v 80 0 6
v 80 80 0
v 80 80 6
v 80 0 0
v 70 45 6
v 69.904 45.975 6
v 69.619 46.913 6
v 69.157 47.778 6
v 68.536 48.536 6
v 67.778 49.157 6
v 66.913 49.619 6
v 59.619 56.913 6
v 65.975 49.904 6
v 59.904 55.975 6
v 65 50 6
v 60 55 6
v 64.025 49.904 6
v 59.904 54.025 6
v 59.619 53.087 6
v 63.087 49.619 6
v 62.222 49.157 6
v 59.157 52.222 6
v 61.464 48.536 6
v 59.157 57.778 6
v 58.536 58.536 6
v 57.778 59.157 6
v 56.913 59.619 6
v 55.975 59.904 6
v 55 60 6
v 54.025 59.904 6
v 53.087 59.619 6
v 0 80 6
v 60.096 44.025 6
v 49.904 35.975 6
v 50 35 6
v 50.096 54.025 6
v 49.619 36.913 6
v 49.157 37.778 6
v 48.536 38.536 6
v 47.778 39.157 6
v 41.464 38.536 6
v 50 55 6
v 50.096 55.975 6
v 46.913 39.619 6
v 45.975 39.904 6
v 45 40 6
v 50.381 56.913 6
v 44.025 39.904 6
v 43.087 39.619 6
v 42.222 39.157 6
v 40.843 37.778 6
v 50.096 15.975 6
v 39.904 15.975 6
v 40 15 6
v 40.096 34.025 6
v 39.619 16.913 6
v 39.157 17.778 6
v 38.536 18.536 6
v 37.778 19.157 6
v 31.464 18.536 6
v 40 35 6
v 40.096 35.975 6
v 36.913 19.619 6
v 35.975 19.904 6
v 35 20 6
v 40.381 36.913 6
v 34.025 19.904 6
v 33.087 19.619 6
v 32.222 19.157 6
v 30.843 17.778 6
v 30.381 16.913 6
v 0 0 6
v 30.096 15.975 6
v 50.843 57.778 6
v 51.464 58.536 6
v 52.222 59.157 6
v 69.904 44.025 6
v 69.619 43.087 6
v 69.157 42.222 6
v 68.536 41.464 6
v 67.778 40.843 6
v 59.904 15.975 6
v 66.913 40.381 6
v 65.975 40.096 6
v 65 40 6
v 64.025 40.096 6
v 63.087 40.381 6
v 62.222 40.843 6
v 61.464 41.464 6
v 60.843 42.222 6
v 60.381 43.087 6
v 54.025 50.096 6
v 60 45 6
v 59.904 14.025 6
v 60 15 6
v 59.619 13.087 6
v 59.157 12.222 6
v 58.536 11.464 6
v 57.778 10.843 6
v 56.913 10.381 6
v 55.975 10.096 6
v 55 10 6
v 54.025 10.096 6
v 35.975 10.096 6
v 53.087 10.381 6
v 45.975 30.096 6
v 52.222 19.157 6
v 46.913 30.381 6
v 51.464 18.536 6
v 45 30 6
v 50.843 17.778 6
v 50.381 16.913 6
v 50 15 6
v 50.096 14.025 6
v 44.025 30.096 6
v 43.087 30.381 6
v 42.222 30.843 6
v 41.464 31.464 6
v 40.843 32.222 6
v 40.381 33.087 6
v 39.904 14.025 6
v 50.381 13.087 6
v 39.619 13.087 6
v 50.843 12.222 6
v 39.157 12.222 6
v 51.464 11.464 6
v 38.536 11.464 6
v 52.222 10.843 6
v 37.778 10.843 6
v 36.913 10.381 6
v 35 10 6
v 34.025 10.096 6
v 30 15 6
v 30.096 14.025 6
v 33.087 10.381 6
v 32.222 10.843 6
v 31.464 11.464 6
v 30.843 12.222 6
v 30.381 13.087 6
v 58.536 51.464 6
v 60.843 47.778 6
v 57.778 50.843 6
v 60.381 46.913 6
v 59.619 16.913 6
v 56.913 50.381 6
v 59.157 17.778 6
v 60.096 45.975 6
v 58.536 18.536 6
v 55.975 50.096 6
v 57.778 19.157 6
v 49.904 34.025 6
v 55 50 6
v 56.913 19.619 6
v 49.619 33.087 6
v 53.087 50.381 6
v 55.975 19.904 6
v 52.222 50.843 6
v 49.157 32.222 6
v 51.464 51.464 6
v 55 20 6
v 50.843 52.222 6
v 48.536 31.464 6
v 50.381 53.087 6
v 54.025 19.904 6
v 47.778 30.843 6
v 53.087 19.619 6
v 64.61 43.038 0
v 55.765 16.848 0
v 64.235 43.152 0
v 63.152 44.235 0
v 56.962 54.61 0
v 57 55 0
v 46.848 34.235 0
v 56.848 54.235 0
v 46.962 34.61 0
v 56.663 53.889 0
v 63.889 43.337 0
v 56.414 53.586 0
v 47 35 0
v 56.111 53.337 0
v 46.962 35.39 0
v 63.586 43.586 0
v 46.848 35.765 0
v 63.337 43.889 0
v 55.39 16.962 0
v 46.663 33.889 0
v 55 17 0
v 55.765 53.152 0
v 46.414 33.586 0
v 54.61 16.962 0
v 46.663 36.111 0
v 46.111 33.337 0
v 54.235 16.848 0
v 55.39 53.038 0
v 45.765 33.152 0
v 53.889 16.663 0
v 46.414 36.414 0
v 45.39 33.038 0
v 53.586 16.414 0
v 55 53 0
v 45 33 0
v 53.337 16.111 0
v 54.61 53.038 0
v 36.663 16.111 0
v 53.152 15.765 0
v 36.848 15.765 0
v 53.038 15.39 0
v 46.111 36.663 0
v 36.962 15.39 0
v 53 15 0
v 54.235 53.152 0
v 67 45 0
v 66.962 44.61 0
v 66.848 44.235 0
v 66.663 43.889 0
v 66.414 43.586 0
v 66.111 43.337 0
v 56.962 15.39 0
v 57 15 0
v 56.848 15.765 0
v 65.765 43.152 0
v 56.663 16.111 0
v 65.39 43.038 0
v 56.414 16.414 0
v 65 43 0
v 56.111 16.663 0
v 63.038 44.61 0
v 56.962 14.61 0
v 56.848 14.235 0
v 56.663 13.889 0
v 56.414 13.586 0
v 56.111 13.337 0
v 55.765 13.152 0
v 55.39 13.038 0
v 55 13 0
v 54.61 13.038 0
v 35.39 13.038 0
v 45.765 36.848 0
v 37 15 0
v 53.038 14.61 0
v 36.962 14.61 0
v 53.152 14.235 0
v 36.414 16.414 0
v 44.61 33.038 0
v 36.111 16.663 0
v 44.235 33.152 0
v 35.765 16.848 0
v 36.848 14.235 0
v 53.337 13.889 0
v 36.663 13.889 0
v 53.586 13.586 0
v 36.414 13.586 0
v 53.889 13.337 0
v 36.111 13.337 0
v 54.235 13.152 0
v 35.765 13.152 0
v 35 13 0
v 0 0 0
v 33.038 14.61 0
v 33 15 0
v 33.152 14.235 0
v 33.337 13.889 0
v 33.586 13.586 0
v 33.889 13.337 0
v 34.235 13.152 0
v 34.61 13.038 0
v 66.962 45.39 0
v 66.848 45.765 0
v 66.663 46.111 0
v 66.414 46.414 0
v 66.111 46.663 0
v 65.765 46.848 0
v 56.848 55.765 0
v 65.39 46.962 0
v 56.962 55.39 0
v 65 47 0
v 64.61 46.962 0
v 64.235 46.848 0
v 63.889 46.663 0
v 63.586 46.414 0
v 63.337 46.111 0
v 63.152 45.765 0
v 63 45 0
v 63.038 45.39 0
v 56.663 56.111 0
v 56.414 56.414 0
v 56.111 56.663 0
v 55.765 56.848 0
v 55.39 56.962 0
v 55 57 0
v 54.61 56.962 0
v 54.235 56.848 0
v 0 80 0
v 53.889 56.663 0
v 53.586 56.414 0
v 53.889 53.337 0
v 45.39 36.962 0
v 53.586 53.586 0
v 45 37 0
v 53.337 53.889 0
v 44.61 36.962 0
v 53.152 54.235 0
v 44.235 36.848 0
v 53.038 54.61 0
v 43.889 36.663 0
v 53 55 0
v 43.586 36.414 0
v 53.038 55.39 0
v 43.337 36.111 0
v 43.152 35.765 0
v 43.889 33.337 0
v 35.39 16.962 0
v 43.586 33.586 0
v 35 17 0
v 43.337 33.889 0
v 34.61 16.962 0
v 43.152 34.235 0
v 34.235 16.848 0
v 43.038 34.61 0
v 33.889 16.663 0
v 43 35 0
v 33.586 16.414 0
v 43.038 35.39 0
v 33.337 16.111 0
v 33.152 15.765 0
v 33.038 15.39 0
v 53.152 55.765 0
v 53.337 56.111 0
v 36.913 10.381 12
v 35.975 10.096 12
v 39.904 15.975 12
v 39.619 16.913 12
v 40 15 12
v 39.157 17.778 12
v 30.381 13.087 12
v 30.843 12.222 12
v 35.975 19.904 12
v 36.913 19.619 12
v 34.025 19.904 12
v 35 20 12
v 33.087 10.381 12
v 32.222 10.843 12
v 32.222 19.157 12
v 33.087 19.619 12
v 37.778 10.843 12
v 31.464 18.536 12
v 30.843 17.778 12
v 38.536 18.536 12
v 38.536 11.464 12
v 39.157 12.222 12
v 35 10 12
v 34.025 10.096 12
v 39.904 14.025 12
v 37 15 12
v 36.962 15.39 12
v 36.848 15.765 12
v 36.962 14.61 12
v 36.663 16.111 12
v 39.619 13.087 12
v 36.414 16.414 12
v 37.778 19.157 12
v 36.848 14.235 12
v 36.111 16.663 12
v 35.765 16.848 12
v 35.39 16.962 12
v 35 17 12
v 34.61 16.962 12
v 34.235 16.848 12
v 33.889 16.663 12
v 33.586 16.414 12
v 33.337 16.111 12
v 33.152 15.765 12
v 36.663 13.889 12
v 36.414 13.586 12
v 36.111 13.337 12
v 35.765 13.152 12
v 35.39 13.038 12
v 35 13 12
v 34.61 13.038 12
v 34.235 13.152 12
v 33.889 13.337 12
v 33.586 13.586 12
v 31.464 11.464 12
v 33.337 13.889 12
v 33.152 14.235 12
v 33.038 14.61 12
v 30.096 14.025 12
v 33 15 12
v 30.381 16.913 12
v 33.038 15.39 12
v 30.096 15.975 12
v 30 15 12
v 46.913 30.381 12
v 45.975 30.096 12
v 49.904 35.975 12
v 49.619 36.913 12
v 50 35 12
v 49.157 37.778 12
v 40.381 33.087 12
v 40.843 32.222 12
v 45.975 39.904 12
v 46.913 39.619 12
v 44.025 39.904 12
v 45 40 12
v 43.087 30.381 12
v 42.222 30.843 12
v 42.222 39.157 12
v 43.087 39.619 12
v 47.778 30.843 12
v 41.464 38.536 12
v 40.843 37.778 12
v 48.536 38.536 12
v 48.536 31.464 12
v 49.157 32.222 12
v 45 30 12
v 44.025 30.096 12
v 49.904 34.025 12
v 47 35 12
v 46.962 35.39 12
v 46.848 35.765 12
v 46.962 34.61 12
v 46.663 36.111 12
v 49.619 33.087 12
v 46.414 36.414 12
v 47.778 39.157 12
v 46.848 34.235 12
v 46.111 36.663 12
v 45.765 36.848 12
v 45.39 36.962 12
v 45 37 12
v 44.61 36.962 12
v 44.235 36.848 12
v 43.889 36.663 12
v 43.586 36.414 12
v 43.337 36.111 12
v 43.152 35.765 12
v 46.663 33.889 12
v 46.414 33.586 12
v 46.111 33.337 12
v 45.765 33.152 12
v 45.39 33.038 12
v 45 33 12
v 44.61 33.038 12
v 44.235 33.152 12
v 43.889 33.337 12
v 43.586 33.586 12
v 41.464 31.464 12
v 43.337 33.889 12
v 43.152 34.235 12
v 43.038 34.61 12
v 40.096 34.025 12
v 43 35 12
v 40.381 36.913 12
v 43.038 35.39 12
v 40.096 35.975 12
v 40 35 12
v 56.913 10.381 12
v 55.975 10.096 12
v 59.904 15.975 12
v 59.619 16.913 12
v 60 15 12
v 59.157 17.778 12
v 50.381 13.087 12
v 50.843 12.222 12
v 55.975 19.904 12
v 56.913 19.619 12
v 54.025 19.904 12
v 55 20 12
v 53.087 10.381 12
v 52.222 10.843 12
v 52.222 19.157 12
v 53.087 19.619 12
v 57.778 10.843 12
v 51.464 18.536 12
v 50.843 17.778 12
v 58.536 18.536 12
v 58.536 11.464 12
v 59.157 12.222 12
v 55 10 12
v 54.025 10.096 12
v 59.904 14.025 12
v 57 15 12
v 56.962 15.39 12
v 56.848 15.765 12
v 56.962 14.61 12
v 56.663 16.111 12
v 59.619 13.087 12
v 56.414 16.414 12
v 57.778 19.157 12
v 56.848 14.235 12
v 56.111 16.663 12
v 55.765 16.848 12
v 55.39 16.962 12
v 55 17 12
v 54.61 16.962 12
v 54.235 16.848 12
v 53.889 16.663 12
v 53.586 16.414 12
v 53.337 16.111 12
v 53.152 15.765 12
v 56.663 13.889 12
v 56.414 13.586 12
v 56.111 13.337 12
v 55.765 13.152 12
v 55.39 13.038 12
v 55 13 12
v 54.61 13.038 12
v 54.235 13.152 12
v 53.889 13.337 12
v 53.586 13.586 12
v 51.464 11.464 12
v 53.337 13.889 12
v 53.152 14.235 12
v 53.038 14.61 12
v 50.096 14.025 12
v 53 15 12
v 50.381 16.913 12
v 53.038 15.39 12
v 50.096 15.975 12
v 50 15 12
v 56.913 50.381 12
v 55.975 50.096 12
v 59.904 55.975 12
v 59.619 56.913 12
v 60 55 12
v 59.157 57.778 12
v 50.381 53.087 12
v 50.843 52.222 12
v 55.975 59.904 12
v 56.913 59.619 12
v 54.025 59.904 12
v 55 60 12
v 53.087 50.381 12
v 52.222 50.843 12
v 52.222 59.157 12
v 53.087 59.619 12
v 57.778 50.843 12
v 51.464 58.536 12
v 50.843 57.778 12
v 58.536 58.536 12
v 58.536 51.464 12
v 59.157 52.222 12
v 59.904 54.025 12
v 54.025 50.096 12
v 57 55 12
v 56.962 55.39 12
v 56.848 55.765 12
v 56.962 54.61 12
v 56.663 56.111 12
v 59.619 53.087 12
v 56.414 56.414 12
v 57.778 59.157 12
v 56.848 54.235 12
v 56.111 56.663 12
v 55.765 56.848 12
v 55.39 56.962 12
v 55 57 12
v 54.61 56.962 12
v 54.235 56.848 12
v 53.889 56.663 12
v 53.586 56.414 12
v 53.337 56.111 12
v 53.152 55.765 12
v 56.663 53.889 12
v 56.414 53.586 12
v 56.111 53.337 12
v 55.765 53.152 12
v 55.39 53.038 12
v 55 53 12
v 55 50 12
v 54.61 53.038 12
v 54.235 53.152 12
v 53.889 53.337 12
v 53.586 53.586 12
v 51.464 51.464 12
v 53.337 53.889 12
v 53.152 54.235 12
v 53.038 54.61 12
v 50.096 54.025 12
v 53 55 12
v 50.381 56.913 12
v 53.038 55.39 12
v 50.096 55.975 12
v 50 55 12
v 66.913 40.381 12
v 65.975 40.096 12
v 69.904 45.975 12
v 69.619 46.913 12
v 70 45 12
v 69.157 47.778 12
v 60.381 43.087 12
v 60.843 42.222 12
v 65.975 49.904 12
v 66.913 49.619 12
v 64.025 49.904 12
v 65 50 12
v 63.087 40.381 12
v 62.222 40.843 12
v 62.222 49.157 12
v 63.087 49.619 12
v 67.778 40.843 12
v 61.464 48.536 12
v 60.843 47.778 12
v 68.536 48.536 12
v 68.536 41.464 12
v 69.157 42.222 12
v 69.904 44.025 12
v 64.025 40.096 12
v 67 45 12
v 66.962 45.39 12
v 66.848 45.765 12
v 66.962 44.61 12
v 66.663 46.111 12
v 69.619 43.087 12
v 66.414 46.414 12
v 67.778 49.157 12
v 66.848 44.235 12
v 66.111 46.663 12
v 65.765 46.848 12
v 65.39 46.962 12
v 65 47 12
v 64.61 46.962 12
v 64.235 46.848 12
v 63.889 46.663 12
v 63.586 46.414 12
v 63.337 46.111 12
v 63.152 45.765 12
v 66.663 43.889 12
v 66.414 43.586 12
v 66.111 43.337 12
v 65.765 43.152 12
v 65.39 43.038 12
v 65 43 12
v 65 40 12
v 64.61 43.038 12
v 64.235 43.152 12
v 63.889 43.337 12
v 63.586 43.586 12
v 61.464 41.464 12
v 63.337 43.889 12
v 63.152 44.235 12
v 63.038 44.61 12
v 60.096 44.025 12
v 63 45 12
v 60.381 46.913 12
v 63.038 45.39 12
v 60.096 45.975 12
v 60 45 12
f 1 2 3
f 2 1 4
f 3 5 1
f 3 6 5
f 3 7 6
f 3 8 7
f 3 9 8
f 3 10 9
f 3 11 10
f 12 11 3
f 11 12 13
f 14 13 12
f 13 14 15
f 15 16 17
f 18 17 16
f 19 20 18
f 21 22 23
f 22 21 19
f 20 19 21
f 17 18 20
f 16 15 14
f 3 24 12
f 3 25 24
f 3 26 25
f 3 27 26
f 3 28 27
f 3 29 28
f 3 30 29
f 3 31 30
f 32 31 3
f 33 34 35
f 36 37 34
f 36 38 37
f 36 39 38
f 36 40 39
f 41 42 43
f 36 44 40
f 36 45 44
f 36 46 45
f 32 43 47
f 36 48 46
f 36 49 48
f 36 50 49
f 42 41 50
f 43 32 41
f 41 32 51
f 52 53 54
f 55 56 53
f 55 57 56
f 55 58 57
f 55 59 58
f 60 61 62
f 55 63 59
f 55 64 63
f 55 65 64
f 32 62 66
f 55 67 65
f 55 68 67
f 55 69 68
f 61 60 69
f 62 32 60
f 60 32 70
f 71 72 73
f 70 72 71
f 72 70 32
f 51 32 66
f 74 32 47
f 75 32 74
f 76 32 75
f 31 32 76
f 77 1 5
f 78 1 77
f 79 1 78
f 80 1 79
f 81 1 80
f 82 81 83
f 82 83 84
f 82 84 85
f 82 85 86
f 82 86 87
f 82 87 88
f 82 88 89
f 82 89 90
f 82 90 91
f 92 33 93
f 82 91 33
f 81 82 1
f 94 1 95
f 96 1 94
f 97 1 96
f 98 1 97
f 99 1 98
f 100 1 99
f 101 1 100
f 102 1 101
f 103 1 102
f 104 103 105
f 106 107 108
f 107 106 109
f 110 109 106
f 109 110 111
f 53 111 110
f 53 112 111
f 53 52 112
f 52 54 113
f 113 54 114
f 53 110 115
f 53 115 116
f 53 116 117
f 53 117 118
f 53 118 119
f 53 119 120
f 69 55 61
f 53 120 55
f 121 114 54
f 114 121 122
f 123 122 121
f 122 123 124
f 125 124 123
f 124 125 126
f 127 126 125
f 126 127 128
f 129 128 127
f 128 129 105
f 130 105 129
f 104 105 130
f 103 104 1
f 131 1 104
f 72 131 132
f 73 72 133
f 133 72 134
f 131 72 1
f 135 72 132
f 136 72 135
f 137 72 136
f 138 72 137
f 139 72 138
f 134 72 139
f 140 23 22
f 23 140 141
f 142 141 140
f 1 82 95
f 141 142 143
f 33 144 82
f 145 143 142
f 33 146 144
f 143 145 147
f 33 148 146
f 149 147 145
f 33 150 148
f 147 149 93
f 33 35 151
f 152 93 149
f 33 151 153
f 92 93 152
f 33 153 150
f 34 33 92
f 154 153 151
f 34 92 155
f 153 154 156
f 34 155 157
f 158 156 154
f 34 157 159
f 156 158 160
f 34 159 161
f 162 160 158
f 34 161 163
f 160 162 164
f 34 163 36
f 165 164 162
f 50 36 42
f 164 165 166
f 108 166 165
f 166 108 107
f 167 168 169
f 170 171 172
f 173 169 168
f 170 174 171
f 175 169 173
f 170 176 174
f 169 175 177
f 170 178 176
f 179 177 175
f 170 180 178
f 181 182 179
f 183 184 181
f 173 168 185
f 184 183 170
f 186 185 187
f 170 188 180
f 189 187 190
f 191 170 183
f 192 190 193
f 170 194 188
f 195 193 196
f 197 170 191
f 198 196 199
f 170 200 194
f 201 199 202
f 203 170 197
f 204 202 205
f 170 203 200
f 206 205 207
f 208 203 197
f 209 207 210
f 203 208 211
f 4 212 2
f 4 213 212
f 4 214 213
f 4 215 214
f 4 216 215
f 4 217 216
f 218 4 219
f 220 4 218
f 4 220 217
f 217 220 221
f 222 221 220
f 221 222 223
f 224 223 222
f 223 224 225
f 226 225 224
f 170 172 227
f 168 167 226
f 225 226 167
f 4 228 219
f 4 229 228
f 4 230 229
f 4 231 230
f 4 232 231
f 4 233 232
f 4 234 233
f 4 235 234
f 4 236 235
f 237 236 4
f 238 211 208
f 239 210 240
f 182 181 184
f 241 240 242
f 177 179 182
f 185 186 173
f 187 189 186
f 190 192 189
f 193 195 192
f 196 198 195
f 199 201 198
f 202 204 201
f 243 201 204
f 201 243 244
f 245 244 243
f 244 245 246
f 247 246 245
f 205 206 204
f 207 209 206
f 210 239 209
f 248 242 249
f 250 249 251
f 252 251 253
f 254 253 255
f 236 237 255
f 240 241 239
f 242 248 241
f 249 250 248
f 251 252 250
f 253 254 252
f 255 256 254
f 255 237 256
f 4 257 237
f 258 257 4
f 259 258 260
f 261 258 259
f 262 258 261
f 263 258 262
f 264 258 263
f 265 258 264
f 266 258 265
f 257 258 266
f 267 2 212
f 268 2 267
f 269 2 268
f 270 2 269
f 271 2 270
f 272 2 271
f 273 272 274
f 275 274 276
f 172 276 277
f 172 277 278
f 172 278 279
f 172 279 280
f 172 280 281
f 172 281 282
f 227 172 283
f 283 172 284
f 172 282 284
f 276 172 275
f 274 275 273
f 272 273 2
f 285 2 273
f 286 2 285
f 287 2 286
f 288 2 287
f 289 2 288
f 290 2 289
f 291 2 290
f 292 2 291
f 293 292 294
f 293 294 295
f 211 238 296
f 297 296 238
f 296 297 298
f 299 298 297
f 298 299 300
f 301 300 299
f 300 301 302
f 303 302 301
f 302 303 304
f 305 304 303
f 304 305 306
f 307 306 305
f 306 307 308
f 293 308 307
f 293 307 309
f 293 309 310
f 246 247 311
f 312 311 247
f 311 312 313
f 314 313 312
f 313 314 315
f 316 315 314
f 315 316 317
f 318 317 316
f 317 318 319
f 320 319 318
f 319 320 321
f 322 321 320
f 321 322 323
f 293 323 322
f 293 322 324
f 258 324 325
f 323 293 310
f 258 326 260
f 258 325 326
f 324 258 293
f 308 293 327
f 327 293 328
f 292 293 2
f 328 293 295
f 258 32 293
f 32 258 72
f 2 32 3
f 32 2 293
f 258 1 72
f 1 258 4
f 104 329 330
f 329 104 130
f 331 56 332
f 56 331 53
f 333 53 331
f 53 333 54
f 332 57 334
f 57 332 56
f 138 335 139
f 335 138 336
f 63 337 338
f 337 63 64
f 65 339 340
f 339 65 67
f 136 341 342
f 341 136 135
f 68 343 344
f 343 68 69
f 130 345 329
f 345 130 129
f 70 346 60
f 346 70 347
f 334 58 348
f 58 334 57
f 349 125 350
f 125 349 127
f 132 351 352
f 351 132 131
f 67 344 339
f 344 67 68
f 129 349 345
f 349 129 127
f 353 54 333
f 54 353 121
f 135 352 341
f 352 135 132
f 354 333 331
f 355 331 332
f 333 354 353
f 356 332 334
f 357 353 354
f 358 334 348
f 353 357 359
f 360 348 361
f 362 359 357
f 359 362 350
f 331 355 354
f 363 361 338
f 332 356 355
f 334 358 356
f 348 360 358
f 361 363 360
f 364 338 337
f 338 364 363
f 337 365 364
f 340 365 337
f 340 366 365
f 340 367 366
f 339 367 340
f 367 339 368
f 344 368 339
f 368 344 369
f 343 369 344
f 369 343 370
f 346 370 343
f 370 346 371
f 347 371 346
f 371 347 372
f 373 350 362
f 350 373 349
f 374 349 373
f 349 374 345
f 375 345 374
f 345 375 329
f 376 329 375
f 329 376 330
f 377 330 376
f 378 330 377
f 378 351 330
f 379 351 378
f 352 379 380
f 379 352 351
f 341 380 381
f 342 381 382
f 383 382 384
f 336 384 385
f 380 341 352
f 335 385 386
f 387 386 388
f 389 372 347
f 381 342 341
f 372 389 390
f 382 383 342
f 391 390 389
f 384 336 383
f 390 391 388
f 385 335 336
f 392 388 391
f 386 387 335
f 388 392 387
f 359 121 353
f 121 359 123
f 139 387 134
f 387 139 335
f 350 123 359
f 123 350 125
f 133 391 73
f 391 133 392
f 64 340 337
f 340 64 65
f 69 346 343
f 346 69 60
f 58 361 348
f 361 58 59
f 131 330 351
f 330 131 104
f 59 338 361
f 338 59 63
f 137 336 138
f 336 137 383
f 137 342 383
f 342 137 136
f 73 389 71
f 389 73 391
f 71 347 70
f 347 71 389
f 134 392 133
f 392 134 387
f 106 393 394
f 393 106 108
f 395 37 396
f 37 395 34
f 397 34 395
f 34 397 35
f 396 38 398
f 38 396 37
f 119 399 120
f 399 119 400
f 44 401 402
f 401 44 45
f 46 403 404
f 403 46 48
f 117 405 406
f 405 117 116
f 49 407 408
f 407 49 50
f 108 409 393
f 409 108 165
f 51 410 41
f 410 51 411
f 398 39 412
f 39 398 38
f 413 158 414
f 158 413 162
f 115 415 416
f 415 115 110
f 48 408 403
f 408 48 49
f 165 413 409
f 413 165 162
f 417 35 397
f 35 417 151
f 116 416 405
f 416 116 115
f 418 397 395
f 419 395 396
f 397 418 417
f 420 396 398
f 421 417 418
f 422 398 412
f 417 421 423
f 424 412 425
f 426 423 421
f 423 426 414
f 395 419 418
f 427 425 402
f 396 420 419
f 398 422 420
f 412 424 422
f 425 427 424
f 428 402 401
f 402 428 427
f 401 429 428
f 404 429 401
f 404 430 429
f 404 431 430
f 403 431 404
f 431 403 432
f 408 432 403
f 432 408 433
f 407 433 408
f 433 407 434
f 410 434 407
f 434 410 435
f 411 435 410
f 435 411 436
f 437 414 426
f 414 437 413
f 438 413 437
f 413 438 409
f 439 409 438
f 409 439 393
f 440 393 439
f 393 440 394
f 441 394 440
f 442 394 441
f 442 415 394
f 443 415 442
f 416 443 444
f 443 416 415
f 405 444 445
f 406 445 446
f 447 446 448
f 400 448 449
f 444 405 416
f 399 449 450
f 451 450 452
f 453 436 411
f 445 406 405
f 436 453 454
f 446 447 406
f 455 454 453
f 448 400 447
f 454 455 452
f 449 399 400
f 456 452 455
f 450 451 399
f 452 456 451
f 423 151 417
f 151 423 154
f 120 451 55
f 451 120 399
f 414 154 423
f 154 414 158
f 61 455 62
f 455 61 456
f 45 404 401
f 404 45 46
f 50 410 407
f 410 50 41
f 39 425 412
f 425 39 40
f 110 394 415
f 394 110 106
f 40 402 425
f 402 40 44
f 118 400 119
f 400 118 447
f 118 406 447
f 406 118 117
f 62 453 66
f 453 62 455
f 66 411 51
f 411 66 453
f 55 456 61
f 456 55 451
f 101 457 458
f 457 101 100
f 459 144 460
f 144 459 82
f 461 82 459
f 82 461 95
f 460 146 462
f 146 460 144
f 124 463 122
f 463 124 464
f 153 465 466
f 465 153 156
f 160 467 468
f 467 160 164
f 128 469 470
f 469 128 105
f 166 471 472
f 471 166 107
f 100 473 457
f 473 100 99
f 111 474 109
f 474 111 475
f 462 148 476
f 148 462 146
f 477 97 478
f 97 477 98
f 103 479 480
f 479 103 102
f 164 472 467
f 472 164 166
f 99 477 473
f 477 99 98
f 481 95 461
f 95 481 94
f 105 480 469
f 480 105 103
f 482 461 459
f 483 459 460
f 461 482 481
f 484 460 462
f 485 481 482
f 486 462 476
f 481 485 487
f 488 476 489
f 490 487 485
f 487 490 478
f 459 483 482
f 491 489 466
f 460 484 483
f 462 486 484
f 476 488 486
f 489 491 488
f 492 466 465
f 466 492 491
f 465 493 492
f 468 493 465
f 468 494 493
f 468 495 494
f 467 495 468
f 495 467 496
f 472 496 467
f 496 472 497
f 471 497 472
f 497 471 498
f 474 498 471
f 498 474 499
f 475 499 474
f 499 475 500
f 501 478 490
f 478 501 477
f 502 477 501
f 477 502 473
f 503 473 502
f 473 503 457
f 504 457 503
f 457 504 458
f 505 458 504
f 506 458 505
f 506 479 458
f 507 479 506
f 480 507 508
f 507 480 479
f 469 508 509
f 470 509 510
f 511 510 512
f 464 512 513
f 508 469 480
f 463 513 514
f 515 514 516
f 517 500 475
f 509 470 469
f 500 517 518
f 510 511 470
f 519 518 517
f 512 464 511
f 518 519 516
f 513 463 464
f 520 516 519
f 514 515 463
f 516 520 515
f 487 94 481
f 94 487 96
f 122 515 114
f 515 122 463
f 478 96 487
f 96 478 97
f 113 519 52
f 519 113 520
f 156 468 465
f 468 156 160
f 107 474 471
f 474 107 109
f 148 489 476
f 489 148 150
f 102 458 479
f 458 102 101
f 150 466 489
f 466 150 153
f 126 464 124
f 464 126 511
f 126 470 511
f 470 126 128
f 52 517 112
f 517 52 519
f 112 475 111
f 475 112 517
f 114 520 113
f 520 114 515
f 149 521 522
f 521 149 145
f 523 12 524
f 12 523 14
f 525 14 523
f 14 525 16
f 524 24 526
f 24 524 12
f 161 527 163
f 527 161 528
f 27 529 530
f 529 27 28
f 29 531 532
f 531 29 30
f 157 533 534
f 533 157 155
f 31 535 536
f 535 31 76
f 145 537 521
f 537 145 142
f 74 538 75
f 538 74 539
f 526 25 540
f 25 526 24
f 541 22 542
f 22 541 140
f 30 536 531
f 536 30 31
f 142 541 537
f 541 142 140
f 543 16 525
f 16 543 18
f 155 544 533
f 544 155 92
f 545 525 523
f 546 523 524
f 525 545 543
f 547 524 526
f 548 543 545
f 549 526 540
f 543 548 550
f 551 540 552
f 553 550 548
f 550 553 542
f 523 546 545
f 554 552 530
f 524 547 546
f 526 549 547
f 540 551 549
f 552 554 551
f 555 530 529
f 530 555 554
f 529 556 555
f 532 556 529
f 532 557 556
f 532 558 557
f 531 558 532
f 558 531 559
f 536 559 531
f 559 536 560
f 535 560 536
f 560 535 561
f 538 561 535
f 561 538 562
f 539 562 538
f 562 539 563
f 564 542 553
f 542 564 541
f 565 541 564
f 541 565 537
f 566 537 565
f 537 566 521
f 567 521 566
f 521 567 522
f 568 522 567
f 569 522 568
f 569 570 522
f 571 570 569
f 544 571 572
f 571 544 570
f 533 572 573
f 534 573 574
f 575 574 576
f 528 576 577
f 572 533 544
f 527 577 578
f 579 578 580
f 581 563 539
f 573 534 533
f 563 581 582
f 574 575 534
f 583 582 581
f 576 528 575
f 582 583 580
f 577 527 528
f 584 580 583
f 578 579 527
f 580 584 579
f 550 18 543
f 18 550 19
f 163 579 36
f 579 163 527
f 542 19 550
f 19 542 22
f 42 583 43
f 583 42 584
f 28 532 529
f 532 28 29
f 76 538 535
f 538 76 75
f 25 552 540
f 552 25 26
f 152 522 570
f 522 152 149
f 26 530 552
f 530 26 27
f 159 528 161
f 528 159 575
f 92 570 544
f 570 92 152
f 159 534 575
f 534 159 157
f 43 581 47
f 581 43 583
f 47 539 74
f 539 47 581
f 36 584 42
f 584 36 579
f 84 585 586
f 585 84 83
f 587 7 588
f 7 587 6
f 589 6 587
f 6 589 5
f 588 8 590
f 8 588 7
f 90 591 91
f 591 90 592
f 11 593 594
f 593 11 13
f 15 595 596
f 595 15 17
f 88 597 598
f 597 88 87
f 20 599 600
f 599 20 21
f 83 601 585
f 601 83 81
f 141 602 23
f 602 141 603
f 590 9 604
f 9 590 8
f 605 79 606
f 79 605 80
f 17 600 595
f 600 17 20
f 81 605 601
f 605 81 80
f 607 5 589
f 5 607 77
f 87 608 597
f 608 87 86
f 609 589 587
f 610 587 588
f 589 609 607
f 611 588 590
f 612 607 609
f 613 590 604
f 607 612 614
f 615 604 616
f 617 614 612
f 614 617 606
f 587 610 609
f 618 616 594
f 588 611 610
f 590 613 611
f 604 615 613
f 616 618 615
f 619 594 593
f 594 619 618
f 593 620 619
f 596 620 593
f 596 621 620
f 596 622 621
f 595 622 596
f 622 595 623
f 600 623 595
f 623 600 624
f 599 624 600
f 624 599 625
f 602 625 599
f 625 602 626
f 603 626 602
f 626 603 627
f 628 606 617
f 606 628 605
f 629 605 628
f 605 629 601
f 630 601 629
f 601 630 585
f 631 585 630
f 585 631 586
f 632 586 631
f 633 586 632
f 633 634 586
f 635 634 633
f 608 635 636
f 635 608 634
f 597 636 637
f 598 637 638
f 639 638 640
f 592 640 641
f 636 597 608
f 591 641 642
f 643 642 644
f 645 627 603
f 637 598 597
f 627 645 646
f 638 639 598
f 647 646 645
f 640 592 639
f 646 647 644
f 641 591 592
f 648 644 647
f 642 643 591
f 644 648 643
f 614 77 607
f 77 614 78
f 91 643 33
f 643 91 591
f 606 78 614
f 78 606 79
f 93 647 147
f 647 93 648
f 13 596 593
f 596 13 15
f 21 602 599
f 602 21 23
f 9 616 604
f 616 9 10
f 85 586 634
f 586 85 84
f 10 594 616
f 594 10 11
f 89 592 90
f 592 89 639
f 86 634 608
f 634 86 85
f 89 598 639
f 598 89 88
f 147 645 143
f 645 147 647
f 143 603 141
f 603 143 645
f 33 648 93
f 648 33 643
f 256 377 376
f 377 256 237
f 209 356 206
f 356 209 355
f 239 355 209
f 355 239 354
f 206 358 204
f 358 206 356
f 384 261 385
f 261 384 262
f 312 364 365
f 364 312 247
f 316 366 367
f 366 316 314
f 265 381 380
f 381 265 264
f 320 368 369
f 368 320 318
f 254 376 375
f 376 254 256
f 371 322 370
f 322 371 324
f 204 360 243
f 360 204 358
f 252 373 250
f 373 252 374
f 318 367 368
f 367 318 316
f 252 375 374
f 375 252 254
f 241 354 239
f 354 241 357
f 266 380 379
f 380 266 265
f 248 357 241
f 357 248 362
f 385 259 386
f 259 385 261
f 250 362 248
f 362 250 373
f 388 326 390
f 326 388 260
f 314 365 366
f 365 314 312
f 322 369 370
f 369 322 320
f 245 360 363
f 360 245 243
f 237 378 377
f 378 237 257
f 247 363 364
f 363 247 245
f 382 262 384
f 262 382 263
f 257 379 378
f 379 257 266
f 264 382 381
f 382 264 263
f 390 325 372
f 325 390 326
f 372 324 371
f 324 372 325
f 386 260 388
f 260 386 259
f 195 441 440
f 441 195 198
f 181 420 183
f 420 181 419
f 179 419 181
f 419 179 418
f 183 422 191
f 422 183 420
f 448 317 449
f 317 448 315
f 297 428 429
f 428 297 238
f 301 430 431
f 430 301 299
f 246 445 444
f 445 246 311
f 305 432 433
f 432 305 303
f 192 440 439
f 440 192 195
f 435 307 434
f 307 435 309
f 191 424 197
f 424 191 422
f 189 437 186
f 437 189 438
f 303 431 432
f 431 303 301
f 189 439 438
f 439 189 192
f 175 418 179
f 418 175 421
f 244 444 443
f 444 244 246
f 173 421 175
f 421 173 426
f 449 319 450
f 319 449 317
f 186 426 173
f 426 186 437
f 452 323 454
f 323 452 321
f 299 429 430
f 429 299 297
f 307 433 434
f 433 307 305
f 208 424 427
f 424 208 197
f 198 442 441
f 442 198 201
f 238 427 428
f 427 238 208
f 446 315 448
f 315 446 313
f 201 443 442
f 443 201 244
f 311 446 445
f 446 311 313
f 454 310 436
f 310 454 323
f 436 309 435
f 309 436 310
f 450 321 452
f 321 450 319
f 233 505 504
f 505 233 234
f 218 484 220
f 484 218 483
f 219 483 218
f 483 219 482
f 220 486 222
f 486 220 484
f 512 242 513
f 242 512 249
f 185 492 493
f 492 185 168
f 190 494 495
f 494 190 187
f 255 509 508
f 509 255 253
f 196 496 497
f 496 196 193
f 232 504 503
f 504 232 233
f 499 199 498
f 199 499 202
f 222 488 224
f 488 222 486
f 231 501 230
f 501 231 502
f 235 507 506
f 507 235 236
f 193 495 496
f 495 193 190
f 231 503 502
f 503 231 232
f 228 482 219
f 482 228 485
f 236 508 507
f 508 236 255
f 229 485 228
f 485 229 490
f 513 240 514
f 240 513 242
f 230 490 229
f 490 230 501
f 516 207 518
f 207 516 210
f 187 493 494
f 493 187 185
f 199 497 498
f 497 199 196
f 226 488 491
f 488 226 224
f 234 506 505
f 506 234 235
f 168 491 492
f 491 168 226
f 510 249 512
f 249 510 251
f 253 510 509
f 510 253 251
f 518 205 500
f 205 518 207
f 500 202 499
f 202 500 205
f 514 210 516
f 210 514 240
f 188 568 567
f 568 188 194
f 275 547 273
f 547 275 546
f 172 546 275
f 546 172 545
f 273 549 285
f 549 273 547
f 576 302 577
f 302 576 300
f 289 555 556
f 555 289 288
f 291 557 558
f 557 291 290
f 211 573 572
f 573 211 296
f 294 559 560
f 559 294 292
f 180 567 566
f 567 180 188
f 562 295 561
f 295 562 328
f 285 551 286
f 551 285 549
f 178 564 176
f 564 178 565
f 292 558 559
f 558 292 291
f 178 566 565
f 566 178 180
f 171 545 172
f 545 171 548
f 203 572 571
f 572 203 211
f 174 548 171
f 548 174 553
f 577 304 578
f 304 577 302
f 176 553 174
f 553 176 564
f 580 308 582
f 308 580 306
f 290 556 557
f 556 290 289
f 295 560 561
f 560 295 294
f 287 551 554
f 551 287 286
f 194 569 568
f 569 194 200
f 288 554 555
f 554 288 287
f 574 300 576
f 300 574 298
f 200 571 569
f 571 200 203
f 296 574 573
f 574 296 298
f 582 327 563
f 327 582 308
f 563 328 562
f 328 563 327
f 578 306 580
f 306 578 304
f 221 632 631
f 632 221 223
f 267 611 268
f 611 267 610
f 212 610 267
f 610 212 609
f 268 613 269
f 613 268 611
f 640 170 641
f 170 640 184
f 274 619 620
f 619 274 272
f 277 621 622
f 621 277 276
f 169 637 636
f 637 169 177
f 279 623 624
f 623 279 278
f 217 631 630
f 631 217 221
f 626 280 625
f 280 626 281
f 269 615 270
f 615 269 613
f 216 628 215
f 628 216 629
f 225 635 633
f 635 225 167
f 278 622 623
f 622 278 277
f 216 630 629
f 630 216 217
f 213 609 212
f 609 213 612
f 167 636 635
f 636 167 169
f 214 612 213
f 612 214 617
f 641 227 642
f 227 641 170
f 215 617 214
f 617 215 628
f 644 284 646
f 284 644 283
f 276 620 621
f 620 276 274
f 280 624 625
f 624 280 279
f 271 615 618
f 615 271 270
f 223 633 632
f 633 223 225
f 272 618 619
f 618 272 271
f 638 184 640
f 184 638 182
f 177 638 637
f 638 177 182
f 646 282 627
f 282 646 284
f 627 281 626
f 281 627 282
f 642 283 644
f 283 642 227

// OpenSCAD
$fn = 32;

// ----------------------------------------------------------------------
// Boss field: plate with bosses at given coordinates
// ----------------------------------------------------------------------

// --- parameters (mm) ---
plate_l = 80;             // plate length, X
plate_w = 80;             // plate width, Y
plate_t = 6;              // plate thickness, Z
boss_d = 10;              // boss diameter
boss_h = 6;               // boss height above the plate
bore_d = 4;               // boss bore

total_h = plate_t + boss_h;  // overall height

difference() {
  union() {
    cube([plate_l, plate_w, plate_t]);
    translate([35, 15, plate_t]) cylinder(h = boss_h, d = boss_d);
    translate([45, 35, plate_t]) cylinder(h = boss_h, d = boss_d);
    translate([55, 15, plate_t]) cylinder(h = boss_h, d = boss_d);
    translate([55, 55, plate_t]) cylinder(h = boss_h, d = boss_d);
    translate([65, 45, plate_t]) cylinder(h = boss_h, d = boss_d);
  }
  translate([35, 15, -1]) cylinder(h = total_h + 2, d = bore_d);
  translate([45, 35, -1]) cylinder(h = total_h + 2, d = bore_d);
  translate([55, 15, -1]) cylinder(h = total_h + 2, d = bore_d);
  translate([55, 55, -1]) cylinder(h = total_h + 2, d = bore_d);
  translate([65, 45, -1]) cylinder(h = total_h + 2, d = bore_d);
}
